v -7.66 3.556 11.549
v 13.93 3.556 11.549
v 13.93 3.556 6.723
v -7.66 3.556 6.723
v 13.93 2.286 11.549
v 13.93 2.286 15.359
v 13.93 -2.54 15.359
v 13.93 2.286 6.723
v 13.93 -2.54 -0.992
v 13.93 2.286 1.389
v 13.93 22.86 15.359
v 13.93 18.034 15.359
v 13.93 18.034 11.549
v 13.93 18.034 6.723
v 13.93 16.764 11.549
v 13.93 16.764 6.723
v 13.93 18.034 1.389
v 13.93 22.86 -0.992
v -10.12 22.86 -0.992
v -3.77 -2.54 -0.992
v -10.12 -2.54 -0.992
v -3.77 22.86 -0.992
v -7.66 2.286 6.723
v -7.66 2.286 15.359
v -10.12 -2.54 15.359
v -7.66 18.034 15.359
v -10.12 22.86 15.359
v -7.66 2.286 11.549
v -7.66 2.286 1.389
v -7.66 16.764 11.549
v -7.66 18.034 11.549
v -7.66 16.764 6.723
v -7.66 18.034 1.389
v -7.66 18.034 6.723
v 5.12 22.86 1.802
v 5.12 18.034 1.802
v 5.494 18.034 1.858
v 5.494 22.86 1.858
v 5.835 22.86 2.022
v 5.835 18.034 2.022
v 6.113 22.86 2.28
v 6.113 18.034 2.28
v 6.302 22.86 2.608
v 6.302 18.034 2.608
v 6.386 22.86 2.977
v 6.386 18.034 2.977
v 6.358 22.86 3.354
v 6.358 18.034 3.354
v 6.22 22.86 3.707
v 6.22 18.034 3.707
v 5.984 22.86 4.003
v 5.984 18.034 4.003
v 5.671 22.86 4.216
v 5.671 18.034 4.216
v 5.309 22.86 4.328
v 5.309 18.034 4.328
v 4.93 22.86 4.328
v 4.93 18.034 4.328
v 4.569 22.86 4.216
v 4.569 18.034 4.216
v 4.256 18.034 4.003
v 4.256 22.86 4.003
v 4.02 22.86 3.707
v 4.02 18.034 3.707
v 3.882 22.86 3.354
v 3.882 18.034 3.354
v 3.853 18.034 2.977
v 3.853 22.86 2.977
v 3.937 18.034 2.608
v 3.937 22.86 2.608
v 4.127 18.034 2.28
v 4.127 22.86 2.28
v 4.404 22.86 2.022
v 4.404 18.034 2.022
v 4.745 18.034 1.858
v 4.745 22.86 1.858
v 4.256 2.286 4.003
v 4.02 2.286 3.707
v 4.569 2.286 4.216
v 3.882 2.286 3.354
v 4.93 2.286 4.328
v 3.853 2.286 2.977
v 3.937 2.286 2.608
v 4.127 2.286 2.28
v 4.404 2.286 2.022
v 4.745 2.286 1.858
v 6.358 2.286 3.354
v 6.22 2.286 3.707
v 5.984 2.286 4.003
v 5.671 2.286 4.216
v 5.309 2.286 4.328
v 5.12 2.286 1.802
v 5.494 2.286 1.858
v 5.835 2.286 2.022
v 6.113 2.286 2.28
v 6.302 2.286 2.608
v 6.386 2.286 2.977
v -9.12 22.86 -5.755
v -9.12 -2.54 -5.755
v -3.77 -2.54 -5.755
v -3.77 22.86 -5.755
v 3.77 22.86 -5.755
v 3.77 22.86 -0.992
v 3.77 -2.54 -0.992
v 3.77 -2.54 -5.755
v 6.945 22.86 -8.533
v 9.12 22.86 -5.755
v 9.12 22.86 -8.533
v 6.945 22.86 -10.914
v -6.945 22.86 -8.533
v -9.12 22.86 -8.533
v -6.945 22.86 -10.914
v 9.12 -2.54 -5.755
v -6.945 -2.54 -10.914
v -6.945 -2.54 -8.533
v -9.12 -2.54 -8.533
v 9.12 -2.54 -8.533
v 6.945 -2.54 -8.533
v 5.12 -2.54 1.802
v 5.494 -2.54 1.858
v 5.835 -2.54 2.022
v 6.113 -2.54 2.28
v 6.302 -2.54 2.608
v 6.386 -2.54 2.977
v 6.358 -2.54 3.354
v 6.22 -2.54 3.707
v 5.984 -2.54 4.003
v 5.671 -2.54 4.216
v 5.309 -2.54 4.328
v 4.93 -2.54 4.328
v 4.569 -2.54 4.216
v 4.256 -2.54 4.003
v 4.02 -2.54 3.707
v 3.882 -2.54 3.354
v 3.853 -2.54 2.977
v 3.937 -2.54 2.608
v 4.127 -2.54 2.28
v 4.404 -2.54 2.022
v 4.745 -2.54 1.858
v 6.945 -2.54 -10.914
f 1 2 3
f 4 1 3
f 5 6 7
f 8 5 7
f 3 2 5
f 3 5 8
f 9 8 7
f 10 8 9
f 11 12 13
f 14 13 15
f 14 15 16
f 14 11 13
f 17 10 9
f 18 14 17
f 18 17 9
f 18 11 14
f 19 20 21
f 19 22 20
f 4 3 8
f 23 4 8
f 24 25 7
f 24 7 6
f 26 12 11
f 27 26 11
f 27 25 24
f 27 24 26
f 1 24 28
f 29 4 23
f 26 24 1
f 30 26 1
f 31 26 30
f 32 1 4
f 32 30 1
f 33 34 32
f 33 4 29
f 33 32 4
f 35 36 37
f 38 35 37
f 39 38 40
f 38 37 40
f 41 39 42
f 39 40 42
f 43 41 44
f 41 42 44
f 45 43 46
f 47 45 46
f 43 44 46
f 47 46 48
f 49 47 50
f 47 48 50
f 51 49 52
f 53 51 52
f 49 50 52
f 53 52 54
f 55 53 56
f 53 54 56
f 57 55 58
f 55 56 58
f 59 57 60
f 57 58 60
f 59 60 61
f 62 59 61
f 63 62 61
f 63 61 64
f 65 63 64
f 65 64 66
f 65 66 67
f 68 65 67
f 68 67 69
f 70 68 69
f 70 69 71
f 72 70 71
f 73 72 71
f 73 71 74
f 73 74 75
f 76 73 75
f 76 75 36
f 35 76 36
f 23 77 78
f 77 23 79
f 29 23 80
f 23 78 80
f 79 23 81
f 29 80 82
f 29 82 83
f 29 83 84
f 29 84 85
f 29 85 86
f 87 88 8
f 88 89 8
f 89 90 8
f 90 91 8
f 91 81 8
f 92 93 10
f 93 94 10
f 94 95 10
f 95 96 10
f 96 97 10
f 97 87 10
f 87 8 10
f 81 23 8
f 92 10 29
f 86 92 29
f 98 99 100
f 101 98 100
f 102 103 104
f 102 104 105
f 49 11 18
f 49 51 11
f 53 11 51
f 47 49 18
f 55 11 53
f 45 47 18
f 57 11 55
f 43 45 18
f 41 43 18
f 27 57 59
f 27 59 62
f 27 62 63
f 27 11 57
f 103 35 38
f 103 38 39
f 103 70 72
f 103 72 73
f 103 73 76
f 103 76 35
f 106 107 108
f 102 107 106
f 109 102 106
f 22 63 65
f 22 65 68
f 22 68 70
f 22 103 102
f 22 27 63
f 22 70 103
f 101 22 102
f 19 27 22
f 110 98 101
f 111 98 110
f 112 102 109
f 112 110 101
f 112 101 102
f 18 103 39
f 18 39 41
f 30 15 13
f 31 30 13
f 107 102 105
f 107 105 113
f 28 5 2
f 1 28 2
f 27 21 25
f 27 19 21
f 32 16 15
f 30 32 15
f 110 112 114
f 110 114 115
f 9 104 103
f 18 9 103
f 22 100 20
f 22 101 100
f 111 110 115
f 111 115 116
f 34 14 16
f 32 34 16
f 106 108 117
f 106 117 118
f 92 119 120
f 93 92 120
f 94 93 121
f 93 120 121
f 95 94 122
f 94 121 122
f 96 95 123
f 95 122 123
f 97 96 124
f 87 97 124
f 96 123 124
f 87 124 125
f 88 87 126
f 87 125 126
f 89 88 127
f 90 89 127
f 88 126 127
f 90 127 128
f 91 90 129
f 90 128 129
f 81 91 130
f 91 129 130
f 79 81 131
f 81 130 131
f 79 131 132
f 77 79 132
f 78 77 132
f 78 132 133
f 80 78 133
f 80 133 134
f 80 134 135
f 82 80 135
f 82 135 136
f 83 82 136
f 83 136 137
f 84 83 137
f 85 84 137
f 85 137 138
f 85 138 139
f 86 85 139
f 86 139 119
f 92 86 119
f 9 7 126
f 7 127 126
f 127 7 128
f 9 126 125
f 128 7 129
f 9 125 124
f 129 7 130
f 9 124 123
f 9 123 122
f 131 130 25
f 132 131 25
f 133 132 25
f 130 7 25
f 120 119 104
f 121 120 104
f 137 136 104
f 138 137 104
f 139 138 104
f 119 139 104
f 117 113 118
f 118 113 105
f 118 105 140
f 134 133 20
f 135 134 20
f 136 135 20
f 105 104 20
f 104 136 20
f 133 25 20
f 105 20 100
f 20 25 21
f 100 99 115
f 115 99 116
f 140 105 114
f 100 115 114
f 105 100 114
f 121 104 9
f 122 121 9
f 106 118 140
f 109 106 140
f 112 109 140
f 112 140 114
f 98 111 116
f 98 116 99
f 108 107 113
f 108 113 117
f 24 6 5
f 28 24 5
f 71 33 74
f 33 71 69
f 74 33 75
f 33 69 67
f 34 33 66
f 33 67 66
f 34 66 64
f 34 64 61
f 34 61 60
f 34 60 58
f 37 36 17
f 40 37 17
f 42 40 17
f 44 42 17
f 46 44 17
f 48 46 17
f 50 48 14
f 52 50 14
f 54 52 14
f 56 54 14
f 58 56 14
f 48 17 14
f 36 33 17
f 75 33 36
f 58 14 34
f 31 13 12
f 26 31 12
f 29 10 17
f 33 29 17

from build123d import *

# Parameters (mm, degrees)
SKETCH1_W           = 20.240625
SKETCH1_H           = 21.828125
BOSS_EXTRUDE1_DEPTH = 20.32
CUT_EXTRUDE1_DEPTH  = 20.32
SKETCH4_W           = 20.240625
SKETCH4_H           = 20.32
BOSS_EXTRUDE2_DEPTH = 4.445
BOSS_EXTRUDE3_DEPTH = 2.54
BOSS_EXTRUDE4_DEPTH = 2.54
SKETCH8_W           = 16.35125
SKETCH8_H           = 25.4
BOSS_EXTRUDE5_DEPTH = 7.62
SKETCH10_R          = 1.27
CUT_EXTRUDE3_DEPTH  = 35.580044657
CUT_EXTRUDE4_DEPTH  = 25.4
SKETCH14_W          = 16.35125
SKETCH14_H          = 25.4
CUT_EXTRUDE5_DEPTH  = 3.81


with BuildPart() as part:
    # Sketch1 → Boss-Extrude1 (new body)
    with BuildSketch(Plane(origin=(0, 0, 0), x_dir=(1, 0, 0), z_dir=(0, 1, 0))):
        Rectangle(SKETCH1_W, SKETCH1_H)
    extrude(amount=BOSS_EXTRUDE1_DEPTH)

    # Sketch2 → Cut-Extrude1 (cut)
    with BuildSketch(Plane(origin=(0, 20.32, 0), x_dir=(1, 0, 0), z_dir=(0, 1, 0))):
        Polygon((10.1203125, 0.9921875), (3.7703125, 0.9921875), (3.7703125, 5.7546875), (9.1203125, 5.7546875), (9.1203125, 8.5328125), (6.9453125, 8.5328125), (6.9453125, 10.9140625), (10.1203125, 10.9140625), (10.1203125, 8.5328125), (10.1203125, 5.7546875), align=None)
        Polygon((-6.9453125, 10.9140625), (-10.1203125, 10.9140625), (-10.1203125, 8.5328125), (-10.1203125, 5.7546875), (-10.1203125, 0.9921875), (-3.7703125, 0.9921875), (-3.7703125, 5.7546875), (-9.1203125, 5.7546875), (-9.1203125, 8.5328125), (-6.9453125, 8.5328125), align=None)
    extrude(amount=-CUT_EXTRUDE1_DEPTH, mode=Mode.SUBTRACT)

    # Sketch4 → Boss-Extrude2 (add)
    with BuildSketch(Plane.XY.offset(10.9140625)):
        with Locations((0, 10.16)):
            Rectangle(SKETCH4_W, SKETCH4_H)
    extrude(amount=BOSS_EXTRUDE2_DEPTH)

    # Sketch6 → Boss-Extrude3 (add)
    with BuildSketch(Plane(origin=(0, 20.32, 0), x_dir=(1, 0, 0), z_dir=(0, 1, 0))):
        Polygon((-10.1203125, -15.3590625), (-10.1203125, 0.9921875), (-3.7703125, 0.9921875), (-3.7703125, 5.7546875), (-9.1203125, 5.7546875), (-9.1203125, 8.5328125), (-6.9453125, 8.5328125), (-6.9453125, 10.9140625), (6.9453125, 10.9140625), (6.9453125, 8.5328125), (9.1203125, 8.5328125), (9.1203125, 5.7546875), (3.7703125, 5.7546875), (3.7703125, 0.9921875), (10.1203125, 0.9921875), (10.1203125, -15.3590625), align=None)
    extrude(amount=BOSS_EXTRUDE3_DEPTH)

    # Sketch7 → Boss-Extrude4 (add)
    with BuildSketch(Plane.XZ):
        Polygon((-10.1203125, -0.9921875), (-10.1203125, 15.3590625), (10.1203125, 15.3590625), (10.1203125, -0.9921875), (3.7703125, -0.9921875), (3.7703125, -5.7546875), (9.1203125, -5.7546875), (9.1203125, -8.5328125), (6.9453125, -8.5328125), (6.9453125, -10.9140625), (-6.9453125, -10.9140625), (-6.9453125, -8.5328125), (-9.1203125, -8.5328125), (-9.1203125, -5.7546875), (-3.7703125, -5.7546875), (-3.7703125, -0.9921875), align=None)
    extrude(amount=BOSS_EXTRUDE4_DEPTH)

    # Sketch8 → Boss-Extrude5 (add)
    with BuildSketch(Plane(origin=(10.1203125, 0, 0), x_dir=(0, 0, -1), z_dir=(1, 0, 0))):
        with Locations((-7.1834375, 10.16)):
            Rectangle(SKETCH8_W, SKETCH8_H)
    extrude(amount=BOSS_EXTRUDE5_DEPTH)

    # Sketch10 → Cut-Extrude3 (cut, through all)
    with BuildSketch(Plane.XZ.offset(2.54)):
        with Locations(Location((5.1196875, 3.0718125, 0), (0, 0, 270))):
            Circle(SKETCH10_R)
    extrude(amount=-CUT_EXTRUDE3_DEPTH, mode=Mode.SUBTRACT)

    # Sketch12 → Cut-Extrude4 (cut)
    with BuildSketch(Plane(origin=(17.7403125, 0, 0), x_dir=(0, 0, -1), z_dir=(1, 0, 0))):
        Polygon((-15.3590625, 18.034), (-15.3590625, 2.286), (-11.5490625, 2.286), (-11.5490625, 3.556), (-6.7230625, 3.556), (-6.7230625, 2.286), (-1.3890625, 2.286), (-1.3890625, 18.034), (-6.7230625, 18.034), (-6.7230625, 16.764), (-11.5490625, 16.764), (-11.5490625, 18.034), align=None)
    extrude(amount=-CUT_EXTRUDE4_DEPTH, mode=Mode.SUBTRACT)

    # Sketch14 → Cut-Extrude5 (cut)
    with BuildSketch(Plane(origin=(17.7403125, 0, 0), x_dir=(0, 0, -1), z_dir=(1, 0, 0))):
        with Locations((-7.1834375, 10.16)):
            Rectangle(SKETCH14_W, SKETCH14_H)
    extrude(amount=-CUT_EXTRUDE5_DEPTH, mode=Mode.SUBTRACT)


solid = part.part
